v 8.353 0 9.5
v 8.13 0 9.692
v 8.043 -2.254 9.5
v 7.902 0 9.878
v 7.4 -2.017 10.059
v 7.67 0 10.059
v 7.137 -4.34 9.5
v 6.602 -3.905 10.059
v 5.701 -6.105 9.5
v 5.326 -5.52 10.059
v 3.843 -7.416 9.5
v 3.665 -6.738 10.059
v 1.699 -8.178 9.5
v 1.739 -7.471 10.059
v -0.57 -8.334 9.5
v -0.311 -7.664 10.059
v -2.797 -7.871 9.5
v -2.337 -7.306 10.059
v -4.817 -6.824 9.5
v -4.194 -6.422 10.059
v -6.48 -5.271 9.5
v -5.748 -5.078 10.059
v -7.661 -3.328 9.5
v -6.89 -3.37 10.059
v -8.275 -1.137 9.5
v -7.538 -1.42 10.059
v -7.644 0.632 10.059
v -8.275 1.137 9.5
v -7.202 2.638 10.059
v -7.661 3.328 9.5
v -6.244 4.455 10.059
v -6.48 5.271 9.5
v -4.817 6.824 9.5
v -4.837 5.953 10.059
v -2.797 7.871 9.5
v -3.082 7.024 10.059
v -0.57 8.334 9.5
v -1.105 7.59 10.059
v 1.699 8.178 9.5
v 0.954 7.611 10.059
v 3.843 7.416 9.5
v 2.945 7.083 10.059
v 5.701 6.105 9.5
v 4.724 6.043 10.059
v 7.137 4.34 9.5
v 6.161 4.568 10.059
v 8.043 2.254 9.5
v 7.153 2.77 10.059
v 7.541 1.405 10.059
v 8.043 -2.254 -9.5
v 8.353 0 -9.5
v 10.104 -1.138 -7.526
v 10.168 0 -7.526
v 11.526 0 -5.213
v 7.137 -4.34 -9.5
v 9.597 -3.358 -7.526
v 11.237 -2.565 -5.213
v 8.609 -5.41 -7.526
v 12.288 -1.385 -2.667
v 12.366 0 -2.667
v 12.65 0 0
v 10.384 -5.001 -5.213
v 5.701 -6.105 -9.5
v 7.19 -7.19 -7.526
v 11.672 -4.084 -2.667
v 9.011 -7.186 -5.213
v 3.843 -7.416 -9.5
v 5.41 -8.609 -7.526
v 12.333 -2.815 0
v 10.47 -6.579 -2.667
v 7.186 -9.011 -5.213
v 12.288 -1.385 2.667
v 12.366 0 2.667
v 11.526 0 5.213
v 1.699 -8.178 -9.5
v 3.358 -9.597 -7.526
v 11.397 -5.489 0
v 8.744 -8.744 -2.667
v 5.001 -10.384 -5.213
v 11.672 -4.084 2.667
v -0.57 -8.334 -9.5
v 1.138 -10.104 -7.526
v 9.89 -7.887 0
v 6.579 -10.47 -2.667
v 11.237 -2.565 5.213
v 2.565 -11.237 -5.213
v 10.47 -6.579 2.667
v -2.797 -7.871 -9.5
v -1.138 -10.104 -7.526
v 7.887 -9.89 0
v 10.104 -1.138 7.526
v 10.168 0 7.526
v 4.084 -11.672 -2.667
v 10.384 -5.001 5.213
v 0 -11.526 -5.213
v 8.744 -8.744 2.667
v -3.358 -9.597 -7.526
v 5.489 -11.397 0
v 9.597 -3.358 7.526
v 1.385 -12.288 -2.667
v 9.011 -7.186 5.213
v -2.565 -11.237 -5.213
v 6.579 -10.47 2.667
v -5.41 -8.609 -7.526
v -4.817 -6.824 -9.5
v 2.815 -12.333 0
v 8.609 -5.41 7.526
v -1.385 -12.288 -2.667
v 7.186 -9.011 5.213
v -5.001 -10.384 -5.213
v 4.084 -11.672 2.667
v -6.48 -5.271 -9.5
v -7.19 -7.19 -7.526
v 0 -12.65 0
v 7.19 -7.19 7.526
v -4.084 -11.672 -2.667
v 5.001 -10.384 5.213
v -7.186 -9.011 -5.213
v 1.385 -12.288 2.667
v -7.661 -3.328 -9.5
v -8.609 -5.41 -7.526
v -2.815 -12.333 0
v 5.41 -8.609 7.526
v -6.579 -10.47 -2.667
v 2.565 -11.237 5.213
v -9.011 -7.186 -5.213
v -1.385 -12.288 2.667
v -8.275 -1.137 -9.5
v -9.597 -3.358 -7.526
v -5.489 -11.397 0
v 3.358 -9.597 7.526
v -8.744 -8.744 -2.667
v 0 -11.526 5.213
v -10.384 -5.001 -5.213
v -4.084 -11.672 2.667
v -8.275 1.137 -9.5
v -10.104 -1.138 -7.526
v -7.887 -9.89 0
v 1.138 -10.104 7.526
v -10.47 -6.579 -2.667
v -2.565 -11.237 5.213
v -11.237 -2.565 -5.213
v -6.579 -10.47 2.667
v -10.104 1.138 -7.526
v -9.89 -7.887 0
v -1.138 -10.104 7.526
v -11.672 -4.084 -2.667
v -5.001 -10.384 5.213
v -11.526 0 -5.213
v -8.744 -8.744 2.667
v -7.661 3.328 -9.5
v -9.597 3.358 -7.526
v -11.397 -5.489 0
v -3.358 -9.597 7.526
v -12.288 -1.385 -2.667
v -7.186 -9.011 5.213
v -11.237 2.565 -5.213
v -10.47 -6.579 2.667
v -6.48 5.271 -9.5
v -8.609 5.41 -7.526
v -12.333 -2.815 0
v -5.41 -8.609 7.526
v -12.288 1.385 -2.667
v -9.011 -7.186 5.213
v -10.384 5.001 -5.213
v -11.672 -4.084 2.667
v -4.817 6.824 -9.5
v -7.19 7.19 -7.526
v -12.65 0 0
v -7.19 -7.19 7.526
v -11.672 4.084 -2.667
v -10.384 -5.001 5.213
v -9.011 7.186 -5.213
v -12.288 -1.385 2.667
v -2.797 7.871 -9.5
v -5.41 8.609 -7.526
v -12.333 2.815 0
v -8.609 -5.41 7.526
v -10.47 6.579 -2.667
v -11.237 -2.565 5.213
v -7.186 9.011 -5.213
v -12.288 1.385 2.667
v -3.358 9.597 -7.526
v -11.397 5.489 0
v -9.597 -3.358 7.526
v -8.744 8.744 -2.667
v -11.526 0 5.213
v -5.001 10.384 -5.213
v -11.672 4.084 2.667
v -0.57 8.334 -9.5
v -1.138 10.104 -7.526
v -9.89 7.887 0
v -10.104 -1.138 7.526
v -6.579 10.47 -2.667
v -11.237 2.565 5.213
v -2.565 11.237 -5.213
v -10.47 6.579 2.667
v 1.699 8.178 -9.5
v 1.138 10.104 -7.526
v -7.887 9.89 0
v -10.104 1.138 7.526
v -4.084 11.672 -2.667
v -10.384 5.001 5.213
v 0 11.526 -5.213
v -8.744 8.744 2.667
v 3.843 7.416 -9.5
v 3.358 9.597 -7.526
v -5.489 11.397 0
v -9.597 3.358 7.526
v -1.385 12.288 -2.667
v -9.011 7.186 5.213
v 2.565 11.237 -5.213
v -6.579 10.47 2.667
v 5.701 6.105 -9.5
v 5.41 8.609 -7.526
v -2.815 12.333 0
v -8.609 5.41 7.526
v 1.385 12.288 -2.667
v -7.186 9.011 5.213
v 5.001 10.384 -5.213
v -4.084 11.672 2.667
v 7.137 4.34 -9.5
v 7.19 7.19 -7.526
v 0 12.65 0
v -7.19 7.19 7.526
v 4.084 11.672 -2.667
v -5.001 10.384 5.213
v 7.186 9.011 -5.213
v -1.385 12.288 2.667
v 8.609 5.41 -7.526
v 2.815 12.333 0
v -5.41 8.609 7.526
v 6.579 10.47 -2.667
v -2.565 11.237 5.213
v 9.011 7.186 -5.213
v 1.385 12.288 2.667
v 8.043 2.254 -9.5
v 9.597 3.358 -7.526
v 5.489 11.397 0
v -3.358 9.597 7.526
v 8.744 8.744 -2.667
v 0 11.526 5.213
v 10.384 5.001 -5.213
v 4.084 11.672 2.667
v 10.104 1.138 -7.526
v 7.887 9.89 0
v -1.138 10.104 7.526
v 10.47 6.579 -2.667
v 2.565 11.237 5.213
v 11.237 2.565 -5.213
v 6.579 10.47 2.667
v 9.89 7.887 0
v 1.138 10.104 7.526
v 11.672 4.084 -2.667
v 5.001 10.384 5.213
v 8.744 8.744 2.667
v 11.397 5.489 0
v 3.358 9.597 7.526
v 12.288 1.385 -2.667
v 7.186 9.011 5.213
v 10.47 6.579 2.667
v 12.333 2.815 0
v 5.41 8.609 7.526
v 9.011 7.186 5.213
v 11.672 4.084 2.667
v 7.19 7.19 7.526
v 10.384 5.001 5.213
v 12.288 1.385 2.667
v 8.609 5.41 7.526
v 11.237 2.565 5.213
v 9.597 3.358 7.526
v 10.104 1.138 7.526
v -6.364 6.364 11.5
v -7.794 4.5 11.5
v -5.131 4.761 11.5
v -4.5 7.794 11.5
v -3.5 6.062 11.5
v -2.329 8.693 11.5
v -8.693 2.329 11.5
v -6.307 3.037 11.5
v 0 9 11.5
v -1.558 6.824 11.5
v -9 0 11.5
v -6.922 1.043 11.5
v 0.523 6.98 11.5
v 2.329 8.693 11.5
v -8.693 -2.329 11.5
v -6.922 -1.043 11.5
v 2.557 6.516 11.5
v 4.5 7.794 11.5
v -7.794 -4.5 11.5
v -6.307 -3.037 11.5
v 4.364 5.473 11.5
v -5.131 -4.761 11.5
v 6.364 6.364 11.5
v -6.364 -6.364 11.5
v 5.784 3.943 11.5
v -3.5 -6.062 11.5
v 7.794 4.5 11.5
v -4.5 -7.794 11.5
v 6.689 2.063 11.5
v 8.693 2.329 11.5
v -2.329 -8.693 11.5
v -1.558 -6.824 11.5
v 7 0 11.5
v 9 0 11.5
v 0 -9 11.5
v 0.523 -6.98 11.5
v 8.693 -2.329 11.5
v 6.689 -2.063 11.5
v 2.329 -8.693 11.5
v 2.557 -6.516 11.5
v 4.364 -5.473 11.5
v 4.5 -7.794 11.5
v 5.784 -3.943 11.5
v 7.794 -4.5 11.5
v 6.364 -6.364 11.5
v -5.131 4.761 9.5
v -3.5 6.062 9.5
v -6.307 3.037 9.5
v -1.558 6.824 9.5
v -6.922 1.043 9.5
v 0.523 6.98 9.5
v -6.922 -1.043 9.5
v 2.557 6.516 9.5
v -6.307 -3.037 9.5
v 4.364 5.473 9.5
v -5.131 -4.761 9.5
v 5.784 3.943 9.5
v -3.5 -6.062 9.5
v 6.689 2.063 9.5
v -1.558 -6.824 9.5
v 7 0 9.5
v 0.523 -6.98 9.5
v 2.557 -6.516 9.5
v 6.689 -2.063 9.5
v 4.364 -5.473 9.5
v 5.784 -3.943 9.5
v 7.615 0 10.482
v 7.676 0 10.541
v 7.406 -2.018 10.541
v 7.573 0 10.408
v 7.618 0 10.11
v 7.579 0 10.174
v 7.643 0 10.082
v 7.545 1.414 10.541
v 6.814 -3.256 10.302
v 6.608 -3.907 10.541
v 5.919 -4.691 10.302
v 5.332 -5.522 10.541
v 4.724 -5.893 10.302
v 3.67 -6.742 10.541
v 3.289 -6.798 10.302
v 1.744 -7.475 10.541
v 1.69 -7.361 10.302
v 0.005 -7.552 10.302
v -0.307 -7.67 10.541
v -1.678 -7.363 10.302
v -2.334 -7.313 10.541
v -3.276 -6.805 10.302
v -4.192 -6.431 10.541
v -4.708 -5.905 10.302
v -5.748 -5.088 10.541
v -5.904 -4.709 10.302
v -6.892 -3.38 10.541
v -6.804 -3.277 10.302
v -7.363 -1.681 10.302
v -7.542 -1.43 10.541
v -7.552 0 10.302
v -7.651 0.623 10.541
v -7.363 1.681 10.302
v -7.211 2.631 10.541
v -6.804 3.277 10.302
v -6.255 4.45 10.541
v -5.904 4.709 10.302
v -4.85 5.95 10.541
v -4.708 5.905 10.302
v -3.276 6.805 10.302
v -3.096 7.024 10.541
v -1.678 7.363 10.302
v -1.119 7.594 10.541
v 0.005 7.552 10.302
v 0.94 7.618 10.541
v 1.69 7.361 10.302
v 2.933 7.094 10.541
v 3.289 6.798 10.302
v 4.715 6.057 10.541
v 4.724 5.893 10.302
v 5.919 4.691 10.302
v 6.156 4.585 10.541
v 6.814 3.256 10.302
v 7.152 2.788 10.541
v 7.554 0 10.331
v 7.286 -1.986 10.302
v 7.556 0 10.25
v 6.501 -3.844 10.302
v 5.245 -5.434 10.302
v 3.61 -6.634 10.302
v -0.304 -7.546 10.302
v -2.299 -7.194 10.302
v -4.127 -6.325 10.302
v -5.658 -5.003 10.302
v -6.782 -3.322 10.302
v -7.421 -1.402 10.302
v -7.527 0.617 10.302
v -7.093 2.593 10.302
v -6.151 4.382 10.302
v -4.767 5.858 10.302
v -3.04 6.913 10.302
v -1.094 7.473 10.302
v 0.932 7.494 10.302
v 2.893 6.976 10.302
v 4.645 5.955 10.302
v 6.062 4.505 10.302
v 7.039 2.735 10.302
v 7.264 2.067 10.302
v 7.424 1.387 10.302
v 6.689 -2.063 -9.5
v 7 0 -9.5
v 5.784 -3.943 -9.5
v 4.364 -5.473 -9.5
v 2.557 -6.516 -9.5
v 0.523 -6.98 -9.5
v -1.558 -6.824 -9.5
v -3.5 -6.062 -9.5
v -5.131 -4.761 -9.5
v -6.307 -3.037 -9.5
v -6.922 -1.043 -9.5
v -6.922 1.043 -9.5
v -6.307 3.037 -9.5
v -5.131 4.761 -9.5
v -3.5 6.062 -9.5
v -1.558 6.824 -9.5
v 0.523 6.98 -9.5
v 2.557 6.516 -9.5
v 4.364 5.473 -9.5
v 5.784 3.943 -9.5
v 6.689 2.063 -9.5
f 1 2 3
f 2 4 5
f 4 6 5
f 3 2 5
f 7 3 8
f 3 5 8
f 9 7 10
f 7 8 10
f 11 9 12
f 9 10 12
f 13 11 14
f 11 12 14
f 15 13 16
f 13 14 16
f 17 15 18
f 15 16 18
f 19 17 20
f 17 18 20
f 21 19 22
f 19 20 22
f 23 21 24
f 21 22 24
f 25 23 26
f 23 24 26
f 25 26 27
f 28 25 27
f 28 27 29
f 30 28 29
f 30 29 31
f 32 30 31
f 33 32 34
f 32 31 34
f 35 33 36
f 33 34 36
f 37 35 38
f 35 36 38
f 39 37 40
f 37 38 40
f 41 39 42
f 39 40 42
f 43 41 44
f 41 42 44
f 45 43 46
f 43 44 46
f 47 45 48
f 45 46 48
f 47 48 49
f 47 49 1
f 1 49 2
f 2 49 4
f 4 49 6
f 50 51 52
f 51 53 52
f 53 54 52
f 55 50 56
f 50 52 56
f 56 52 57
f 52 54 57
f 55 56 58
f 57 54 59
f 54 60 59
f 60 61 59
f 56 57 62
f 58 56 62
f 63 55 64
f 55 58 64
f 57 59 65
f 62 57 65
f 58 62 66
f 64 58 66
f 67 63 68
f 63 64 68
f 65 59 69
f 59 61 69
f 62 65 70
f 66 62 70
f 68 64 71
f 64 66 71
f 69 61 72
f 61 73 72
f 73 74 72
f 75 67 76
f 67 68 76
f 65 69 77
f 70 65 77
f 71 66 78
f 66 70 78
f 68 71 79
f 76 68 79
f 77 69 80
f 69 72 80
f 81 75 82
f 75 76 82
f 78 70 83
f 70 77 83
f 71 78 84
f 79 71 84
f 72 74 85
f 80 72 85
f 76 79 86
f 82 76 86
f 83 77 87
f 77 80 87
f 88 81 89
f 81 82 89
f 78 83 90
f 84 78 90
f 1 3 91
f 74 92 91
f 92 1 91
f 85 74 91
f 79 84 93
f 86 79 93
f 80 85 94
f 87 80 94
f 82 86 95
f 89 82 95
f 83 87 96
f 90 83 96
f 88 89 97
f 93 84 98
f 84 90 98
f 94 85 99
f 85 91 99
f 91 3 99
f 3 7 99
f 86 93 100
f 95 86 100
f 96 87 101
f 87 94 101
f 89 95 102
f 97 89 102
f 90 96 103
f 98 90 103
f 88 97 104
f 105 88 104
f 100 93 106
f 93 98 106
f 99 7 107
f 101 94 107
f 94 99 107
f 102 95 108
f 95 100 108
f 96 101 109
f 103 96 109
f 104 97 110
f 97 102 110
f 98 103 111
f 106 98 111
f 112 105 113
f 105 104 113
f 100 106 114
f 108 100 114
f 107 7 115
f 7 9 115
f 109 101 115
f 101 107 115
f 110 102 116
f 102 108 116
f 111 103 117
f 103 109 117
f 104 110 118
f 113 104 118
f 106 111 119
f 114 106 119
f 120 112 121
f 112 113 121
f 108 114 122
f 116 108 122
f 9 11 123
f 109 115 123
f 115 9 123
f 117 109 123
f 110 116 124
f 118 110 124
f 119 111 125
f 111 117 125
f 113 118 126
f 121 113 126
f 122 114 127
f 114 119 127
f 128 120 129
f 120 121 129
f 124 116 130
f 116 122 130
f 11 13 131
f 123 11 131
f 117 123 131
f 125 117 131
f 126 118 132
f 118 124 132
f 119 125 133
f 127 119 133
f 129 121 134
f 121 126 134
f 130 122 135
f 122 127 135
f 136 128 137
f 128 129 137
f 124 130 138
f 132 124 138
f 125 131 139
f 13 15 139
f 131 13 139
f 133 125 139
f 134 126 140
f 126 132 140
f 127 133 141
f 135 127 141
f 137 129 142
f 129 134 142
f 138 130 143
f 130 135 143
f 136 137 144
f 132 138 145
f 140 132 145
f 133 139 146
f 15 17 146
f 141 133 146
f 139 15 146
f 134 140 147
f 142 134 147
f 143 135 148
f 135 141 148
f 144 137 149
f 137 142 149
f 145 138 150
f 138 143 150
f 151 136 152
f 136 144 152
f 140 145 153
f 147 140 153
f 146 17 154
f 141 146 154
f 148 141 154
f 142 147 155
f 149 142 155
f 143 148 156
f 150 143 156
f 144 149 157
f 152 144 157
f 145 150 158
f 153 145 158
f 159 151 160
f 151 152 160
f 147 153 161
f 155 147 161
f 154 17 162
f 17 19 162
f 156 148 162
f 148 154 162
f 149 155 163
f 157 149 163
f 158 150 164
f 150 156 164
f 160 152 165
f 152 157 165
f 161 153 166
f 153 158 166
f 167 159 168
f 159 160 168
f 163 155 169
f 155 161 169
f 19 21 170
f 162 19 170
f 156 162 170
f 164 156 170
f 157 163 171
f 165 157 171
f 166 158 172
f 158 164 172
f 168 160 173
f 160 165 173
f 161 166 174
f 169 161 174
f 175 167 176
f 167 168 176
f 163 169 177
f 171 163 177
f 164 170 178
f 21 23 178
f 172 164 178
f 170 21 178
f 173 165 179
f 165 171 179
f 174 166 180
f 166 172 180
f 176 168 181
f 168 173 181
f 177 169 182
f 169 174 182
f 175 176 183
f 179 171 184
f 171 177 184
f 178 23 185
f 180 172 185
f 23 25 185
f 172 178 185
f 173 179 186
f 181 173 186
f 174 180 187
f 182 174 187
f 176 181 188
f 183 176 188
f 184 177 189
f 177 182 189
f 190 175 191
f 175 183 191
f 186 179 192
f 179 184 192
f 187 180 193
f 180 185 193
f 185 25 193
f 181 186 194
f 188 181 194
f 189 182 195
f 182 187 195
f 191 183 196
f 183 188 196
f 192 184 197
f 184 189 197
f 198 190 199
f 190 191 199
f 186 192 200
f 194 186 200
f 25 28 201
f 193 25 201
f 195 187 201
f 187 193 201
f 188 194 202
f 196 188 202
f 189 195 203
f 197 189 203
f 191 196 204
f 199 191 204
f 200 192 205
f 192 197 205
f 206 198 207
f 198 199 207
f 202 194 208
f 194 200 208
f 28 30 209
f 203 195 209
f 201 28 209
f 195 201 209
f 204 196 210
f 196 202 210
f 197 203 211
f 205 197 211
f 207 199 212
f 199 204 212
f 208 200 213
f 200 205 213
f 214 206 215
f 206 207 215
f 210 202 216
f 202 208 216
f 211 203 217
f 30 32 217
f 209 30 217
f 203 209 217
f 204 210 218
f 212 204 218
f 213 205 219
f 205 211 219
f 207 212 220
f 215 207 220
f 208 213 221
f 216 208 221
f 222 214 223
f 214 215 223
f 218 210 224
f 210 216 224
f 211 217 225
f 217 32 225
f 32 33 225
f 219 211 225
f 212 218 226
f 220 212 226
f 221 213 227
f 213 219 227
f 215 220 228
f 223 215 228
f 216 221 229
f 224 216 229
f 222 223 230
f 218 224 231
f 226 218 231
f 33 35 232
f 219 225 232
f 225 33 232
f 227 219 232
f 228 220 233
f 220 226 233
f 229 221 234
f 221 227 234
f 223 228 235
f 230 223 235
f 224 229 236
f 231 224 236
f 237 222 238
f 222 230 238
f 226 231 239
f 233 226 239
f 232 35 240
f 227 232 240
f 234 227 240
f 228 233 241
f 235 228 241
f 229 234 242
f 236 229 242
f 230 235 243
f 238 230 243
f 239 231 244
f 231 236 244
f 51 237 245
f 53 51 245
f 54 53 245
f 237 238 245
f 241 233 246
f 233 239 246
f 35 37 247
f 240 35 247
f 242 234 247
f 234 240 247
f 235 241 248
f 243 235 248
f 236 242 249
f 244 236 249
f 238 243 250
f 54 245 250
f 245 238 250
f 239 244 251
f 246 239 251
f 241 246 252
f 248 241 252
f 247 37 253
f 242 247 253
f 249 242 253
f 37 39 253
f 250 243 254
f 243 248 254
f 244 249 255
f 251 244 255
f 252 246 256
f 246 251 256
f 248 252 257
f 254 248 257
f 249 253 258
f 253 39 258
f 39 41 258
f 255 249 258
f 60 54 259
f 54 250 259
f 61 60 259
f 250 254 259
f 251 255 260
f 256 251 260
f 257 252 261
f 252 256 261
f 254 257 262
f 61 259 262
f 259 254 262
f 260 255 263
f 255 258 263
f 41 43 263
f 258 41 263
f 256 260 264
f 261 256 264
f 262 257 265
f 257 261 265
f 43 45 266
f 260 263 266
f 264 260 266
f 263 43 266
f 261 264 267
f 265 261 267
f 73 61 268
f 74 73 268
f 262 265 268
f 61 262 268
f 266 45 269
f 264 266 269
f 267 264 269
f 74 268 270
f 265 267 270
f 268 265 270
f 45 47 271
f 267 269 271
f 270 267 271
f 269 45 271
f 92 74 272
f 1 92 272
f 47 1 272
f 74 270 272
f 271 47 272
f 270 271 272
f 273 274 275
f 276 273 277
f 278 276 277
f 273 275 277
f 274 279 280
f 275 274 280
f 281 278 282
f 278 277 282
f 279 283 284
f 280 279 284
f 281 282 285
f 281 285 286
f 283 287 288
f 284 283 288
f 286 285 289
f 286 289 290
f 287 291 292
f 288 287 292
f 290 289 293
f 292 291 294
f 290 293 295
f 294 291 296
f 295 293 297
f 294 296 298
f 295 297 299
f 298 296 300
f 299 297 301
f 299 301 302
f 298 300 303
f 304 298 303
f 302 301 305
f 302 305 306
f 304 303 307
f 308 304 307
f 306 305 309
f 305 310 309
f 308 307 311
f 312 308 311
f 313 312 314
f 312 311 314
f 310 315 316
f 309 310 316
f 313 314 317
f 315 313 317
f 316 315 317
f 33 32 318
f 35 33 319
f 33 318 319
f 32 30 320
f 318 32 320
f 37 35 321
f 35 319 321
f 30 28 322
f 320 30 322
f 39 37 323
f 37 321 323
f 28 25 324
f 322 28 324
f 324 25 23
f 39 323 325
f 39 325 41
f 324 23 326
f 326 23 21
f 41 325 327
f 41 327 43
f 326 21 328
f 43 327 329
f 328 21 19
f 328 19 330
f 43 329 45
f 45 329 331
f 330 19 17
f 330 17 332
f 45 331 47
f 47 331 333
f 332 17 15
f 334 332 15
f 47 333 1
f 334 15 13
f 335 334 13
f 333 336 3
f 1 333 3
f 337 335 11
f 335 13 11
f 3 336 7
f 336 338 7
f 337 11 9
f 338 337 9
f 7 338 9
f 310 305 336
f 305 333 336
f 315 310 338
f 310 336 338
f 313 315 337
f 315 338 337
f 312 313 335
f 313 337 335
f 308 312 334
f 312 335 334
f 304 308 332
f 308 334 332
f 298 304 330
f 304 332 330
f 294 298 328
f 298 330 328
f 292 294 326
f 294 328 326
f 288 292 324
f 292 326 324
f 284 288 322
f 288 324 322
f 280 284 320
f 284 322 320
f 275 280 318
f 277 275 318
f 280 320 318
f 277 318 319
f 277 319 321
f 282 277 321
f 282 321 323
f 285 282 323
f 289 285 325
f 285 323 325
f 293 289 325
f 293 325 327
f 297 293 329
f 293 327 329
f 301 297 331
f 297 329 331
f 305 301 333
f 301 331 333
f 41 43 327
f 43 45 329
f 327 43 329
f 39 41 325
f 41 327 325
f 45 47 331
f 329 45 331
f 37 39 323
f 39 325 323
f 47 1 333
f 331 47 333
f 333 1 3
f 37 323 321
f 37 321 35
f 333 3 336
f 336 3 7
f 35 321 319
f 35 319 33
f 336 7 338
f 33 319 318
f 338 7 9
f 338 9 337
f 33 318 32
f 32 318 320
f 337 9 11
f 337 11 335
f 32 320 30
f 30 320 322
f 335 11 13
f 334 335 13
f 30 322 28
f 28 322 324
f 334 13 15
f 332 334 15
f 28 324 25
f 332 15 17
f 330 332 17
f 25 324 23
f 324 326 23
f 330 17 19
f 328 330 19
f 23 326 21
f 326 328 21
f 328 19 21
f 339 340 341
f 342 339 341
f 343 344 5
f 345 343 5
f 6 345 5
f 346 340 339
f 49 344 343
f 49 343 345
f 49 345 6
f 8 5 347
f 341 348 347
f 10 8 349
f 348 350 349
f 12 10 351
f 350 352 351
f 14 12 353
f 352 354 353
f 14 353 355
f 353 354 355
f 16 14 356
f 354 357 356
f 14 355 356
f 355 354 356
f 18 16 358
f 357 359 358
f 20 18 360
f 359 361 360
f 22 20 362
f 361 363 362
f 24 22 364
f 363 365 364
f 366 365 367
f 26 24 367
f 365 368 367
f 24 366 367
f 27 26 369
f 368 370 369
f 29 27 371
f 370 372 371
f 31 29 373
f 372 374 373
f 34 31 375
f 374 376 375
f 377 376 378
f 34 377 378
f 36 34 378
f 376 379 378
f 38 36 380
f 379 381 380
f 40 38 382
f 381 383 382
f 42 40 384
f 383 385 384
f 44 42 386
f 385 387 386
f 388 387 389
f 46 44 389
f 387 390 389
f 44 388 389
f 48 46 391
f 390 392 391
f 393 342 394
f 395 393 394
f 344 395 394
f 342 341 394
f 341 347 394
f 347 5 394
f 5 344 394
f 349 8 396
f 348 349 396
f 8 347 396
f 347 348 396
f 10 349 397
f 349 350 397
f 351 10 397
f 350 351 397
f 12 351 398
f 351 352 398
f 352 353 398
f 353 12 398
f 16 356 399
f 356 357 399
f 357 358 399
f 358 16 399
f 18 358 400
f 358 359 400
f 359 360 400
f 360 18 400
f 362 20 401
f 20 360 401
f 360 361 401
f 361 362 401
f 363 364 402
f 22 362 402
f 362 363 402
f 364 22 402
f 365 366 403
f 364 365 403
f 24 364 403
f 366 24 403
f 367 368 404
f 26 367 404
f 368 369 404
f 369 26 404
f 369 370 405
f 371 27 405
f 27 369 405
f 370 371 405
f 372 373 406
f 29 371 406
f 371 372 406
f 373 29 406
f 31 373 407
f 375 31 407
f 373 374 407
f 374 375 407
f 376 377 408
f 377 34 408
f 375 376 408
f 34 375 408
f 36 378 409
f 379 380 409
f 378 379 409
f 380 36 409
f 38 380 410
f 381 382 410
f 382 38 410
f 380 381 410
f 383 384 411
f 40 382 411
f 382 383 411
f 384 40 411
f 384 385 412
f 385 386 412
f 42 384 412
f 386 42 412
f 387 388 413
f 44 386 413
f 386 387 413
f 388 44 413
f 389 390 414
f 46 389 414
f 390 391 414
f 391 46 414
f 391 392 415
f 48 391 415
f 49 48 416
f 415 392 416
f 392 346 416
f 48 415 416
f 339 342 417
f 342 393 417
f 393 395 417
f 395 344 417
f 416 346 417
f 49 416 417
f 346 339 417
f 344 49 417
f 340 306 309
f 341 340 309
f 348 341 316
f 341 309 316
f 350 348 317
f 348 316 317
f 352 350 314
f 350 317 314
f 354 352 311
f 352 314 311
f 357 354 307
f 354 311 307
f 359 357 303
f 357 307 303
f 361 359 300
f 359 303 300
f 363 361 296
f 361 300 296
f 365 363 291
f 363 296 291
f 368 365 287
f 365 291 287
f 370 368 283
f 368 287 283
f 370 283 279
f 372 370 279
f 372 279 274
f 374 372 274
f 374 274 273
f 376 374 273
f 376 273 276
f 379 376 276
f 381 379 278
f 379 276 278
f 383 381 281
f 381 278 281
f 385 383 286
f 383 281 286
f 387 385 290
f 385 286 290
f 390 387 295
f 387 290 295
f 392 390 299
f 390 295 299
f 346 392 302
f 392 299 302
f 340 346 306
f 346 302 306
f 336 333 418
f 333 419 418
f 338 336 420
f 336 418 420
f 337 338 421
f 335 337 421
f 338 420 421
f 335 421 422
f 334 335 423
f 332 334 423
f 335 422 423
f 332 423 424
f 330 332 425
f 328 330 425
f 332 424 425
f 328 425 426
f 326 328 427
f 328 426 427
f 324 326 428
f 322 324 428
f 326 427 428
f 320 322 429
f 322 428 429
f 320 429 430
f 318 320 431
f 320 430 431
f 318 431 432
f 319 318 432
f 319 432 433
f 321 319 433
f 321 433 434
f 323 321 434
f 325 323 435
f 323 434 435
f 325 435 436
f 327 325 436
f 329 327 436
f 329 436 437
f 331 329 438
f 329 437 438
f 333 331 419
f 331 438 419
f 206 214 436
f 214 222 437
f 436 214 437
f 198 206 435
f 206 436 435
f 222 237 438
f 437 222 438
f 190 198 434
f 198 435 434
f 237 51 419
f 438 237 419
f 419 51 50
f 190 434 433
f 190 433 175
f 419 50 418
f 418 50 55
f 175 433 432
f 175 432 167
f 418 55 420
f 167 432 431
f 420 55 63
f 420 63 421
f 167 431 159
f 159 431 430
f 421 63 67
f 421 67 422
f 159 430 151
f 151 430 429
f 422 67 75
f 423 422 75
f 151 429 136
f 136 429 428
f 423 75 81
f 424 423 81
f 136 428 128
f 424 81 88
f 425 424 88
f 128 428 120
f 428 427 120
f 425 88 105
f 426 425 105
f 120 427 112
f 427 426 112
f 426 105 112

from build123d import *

# Parameters (mm, degrees)
F2_R = 0.3


with BuildPart() as f1:
    # F0 (on Front) → F1 (revolve)
    with BuildSketch(Plane.XZ):
        with BuildLine():
            ThreePointArc((7, 10.5367215015), (7.1729141054, 10.4197794236), (7.3438749989, 10.3))
            Line((7.3438749989, 10.3), (9, 11.5))
            Line((9, 11.5), (7, 11.5))
            Line((7, 11.5), (7, 10.5367215015))
        make_face()
        with BuildLine():
            ThreePointArc((8.3529934754, 9.5), (7.8586207425, 9.9128492385), (7.3438749989, 10.3))
            ThreePointArc((7.3438749989, 10.3), (7.1729141054, 10.4197794236), (7, 10.5367215015))
            Line((7, 10.5367215015), (7, 9.5))
            Line((7, 9.5), (8.3529934754, 9.5))
        make_face()
    revolve(axis=Axis((0, 0, 9.4776125625), (0, 0, -1)))

    # F2
    f2_edges = [f1.edges().sort_by_distance(p)[0] for p in [
        (-7.343875, 0, 10.3),
    ]]
    fillet(f2_edges, radius=F2_R)


with BuildPart() as f3:
    # F0 (on Front) → F3 (revolve)
    with BuildSketch(Plane.XZ):
        with BuildLine():
            ThreePointArc((8.3529934754, -9.5), (12.65, 0), (8.3529934754, 9.5))
            Line((8.3529934754, 9.5), (7, 9.5))
            Line((7, 9.5), (7, -9.5))
            Line((7, -9.5), (8.3529934754, -9.5))
        make_face()
    revolve(axis=Axis((0, 0, 9.4776125625), (0, 0, -1)))


solid = Compound([f1.part, f3.part])
